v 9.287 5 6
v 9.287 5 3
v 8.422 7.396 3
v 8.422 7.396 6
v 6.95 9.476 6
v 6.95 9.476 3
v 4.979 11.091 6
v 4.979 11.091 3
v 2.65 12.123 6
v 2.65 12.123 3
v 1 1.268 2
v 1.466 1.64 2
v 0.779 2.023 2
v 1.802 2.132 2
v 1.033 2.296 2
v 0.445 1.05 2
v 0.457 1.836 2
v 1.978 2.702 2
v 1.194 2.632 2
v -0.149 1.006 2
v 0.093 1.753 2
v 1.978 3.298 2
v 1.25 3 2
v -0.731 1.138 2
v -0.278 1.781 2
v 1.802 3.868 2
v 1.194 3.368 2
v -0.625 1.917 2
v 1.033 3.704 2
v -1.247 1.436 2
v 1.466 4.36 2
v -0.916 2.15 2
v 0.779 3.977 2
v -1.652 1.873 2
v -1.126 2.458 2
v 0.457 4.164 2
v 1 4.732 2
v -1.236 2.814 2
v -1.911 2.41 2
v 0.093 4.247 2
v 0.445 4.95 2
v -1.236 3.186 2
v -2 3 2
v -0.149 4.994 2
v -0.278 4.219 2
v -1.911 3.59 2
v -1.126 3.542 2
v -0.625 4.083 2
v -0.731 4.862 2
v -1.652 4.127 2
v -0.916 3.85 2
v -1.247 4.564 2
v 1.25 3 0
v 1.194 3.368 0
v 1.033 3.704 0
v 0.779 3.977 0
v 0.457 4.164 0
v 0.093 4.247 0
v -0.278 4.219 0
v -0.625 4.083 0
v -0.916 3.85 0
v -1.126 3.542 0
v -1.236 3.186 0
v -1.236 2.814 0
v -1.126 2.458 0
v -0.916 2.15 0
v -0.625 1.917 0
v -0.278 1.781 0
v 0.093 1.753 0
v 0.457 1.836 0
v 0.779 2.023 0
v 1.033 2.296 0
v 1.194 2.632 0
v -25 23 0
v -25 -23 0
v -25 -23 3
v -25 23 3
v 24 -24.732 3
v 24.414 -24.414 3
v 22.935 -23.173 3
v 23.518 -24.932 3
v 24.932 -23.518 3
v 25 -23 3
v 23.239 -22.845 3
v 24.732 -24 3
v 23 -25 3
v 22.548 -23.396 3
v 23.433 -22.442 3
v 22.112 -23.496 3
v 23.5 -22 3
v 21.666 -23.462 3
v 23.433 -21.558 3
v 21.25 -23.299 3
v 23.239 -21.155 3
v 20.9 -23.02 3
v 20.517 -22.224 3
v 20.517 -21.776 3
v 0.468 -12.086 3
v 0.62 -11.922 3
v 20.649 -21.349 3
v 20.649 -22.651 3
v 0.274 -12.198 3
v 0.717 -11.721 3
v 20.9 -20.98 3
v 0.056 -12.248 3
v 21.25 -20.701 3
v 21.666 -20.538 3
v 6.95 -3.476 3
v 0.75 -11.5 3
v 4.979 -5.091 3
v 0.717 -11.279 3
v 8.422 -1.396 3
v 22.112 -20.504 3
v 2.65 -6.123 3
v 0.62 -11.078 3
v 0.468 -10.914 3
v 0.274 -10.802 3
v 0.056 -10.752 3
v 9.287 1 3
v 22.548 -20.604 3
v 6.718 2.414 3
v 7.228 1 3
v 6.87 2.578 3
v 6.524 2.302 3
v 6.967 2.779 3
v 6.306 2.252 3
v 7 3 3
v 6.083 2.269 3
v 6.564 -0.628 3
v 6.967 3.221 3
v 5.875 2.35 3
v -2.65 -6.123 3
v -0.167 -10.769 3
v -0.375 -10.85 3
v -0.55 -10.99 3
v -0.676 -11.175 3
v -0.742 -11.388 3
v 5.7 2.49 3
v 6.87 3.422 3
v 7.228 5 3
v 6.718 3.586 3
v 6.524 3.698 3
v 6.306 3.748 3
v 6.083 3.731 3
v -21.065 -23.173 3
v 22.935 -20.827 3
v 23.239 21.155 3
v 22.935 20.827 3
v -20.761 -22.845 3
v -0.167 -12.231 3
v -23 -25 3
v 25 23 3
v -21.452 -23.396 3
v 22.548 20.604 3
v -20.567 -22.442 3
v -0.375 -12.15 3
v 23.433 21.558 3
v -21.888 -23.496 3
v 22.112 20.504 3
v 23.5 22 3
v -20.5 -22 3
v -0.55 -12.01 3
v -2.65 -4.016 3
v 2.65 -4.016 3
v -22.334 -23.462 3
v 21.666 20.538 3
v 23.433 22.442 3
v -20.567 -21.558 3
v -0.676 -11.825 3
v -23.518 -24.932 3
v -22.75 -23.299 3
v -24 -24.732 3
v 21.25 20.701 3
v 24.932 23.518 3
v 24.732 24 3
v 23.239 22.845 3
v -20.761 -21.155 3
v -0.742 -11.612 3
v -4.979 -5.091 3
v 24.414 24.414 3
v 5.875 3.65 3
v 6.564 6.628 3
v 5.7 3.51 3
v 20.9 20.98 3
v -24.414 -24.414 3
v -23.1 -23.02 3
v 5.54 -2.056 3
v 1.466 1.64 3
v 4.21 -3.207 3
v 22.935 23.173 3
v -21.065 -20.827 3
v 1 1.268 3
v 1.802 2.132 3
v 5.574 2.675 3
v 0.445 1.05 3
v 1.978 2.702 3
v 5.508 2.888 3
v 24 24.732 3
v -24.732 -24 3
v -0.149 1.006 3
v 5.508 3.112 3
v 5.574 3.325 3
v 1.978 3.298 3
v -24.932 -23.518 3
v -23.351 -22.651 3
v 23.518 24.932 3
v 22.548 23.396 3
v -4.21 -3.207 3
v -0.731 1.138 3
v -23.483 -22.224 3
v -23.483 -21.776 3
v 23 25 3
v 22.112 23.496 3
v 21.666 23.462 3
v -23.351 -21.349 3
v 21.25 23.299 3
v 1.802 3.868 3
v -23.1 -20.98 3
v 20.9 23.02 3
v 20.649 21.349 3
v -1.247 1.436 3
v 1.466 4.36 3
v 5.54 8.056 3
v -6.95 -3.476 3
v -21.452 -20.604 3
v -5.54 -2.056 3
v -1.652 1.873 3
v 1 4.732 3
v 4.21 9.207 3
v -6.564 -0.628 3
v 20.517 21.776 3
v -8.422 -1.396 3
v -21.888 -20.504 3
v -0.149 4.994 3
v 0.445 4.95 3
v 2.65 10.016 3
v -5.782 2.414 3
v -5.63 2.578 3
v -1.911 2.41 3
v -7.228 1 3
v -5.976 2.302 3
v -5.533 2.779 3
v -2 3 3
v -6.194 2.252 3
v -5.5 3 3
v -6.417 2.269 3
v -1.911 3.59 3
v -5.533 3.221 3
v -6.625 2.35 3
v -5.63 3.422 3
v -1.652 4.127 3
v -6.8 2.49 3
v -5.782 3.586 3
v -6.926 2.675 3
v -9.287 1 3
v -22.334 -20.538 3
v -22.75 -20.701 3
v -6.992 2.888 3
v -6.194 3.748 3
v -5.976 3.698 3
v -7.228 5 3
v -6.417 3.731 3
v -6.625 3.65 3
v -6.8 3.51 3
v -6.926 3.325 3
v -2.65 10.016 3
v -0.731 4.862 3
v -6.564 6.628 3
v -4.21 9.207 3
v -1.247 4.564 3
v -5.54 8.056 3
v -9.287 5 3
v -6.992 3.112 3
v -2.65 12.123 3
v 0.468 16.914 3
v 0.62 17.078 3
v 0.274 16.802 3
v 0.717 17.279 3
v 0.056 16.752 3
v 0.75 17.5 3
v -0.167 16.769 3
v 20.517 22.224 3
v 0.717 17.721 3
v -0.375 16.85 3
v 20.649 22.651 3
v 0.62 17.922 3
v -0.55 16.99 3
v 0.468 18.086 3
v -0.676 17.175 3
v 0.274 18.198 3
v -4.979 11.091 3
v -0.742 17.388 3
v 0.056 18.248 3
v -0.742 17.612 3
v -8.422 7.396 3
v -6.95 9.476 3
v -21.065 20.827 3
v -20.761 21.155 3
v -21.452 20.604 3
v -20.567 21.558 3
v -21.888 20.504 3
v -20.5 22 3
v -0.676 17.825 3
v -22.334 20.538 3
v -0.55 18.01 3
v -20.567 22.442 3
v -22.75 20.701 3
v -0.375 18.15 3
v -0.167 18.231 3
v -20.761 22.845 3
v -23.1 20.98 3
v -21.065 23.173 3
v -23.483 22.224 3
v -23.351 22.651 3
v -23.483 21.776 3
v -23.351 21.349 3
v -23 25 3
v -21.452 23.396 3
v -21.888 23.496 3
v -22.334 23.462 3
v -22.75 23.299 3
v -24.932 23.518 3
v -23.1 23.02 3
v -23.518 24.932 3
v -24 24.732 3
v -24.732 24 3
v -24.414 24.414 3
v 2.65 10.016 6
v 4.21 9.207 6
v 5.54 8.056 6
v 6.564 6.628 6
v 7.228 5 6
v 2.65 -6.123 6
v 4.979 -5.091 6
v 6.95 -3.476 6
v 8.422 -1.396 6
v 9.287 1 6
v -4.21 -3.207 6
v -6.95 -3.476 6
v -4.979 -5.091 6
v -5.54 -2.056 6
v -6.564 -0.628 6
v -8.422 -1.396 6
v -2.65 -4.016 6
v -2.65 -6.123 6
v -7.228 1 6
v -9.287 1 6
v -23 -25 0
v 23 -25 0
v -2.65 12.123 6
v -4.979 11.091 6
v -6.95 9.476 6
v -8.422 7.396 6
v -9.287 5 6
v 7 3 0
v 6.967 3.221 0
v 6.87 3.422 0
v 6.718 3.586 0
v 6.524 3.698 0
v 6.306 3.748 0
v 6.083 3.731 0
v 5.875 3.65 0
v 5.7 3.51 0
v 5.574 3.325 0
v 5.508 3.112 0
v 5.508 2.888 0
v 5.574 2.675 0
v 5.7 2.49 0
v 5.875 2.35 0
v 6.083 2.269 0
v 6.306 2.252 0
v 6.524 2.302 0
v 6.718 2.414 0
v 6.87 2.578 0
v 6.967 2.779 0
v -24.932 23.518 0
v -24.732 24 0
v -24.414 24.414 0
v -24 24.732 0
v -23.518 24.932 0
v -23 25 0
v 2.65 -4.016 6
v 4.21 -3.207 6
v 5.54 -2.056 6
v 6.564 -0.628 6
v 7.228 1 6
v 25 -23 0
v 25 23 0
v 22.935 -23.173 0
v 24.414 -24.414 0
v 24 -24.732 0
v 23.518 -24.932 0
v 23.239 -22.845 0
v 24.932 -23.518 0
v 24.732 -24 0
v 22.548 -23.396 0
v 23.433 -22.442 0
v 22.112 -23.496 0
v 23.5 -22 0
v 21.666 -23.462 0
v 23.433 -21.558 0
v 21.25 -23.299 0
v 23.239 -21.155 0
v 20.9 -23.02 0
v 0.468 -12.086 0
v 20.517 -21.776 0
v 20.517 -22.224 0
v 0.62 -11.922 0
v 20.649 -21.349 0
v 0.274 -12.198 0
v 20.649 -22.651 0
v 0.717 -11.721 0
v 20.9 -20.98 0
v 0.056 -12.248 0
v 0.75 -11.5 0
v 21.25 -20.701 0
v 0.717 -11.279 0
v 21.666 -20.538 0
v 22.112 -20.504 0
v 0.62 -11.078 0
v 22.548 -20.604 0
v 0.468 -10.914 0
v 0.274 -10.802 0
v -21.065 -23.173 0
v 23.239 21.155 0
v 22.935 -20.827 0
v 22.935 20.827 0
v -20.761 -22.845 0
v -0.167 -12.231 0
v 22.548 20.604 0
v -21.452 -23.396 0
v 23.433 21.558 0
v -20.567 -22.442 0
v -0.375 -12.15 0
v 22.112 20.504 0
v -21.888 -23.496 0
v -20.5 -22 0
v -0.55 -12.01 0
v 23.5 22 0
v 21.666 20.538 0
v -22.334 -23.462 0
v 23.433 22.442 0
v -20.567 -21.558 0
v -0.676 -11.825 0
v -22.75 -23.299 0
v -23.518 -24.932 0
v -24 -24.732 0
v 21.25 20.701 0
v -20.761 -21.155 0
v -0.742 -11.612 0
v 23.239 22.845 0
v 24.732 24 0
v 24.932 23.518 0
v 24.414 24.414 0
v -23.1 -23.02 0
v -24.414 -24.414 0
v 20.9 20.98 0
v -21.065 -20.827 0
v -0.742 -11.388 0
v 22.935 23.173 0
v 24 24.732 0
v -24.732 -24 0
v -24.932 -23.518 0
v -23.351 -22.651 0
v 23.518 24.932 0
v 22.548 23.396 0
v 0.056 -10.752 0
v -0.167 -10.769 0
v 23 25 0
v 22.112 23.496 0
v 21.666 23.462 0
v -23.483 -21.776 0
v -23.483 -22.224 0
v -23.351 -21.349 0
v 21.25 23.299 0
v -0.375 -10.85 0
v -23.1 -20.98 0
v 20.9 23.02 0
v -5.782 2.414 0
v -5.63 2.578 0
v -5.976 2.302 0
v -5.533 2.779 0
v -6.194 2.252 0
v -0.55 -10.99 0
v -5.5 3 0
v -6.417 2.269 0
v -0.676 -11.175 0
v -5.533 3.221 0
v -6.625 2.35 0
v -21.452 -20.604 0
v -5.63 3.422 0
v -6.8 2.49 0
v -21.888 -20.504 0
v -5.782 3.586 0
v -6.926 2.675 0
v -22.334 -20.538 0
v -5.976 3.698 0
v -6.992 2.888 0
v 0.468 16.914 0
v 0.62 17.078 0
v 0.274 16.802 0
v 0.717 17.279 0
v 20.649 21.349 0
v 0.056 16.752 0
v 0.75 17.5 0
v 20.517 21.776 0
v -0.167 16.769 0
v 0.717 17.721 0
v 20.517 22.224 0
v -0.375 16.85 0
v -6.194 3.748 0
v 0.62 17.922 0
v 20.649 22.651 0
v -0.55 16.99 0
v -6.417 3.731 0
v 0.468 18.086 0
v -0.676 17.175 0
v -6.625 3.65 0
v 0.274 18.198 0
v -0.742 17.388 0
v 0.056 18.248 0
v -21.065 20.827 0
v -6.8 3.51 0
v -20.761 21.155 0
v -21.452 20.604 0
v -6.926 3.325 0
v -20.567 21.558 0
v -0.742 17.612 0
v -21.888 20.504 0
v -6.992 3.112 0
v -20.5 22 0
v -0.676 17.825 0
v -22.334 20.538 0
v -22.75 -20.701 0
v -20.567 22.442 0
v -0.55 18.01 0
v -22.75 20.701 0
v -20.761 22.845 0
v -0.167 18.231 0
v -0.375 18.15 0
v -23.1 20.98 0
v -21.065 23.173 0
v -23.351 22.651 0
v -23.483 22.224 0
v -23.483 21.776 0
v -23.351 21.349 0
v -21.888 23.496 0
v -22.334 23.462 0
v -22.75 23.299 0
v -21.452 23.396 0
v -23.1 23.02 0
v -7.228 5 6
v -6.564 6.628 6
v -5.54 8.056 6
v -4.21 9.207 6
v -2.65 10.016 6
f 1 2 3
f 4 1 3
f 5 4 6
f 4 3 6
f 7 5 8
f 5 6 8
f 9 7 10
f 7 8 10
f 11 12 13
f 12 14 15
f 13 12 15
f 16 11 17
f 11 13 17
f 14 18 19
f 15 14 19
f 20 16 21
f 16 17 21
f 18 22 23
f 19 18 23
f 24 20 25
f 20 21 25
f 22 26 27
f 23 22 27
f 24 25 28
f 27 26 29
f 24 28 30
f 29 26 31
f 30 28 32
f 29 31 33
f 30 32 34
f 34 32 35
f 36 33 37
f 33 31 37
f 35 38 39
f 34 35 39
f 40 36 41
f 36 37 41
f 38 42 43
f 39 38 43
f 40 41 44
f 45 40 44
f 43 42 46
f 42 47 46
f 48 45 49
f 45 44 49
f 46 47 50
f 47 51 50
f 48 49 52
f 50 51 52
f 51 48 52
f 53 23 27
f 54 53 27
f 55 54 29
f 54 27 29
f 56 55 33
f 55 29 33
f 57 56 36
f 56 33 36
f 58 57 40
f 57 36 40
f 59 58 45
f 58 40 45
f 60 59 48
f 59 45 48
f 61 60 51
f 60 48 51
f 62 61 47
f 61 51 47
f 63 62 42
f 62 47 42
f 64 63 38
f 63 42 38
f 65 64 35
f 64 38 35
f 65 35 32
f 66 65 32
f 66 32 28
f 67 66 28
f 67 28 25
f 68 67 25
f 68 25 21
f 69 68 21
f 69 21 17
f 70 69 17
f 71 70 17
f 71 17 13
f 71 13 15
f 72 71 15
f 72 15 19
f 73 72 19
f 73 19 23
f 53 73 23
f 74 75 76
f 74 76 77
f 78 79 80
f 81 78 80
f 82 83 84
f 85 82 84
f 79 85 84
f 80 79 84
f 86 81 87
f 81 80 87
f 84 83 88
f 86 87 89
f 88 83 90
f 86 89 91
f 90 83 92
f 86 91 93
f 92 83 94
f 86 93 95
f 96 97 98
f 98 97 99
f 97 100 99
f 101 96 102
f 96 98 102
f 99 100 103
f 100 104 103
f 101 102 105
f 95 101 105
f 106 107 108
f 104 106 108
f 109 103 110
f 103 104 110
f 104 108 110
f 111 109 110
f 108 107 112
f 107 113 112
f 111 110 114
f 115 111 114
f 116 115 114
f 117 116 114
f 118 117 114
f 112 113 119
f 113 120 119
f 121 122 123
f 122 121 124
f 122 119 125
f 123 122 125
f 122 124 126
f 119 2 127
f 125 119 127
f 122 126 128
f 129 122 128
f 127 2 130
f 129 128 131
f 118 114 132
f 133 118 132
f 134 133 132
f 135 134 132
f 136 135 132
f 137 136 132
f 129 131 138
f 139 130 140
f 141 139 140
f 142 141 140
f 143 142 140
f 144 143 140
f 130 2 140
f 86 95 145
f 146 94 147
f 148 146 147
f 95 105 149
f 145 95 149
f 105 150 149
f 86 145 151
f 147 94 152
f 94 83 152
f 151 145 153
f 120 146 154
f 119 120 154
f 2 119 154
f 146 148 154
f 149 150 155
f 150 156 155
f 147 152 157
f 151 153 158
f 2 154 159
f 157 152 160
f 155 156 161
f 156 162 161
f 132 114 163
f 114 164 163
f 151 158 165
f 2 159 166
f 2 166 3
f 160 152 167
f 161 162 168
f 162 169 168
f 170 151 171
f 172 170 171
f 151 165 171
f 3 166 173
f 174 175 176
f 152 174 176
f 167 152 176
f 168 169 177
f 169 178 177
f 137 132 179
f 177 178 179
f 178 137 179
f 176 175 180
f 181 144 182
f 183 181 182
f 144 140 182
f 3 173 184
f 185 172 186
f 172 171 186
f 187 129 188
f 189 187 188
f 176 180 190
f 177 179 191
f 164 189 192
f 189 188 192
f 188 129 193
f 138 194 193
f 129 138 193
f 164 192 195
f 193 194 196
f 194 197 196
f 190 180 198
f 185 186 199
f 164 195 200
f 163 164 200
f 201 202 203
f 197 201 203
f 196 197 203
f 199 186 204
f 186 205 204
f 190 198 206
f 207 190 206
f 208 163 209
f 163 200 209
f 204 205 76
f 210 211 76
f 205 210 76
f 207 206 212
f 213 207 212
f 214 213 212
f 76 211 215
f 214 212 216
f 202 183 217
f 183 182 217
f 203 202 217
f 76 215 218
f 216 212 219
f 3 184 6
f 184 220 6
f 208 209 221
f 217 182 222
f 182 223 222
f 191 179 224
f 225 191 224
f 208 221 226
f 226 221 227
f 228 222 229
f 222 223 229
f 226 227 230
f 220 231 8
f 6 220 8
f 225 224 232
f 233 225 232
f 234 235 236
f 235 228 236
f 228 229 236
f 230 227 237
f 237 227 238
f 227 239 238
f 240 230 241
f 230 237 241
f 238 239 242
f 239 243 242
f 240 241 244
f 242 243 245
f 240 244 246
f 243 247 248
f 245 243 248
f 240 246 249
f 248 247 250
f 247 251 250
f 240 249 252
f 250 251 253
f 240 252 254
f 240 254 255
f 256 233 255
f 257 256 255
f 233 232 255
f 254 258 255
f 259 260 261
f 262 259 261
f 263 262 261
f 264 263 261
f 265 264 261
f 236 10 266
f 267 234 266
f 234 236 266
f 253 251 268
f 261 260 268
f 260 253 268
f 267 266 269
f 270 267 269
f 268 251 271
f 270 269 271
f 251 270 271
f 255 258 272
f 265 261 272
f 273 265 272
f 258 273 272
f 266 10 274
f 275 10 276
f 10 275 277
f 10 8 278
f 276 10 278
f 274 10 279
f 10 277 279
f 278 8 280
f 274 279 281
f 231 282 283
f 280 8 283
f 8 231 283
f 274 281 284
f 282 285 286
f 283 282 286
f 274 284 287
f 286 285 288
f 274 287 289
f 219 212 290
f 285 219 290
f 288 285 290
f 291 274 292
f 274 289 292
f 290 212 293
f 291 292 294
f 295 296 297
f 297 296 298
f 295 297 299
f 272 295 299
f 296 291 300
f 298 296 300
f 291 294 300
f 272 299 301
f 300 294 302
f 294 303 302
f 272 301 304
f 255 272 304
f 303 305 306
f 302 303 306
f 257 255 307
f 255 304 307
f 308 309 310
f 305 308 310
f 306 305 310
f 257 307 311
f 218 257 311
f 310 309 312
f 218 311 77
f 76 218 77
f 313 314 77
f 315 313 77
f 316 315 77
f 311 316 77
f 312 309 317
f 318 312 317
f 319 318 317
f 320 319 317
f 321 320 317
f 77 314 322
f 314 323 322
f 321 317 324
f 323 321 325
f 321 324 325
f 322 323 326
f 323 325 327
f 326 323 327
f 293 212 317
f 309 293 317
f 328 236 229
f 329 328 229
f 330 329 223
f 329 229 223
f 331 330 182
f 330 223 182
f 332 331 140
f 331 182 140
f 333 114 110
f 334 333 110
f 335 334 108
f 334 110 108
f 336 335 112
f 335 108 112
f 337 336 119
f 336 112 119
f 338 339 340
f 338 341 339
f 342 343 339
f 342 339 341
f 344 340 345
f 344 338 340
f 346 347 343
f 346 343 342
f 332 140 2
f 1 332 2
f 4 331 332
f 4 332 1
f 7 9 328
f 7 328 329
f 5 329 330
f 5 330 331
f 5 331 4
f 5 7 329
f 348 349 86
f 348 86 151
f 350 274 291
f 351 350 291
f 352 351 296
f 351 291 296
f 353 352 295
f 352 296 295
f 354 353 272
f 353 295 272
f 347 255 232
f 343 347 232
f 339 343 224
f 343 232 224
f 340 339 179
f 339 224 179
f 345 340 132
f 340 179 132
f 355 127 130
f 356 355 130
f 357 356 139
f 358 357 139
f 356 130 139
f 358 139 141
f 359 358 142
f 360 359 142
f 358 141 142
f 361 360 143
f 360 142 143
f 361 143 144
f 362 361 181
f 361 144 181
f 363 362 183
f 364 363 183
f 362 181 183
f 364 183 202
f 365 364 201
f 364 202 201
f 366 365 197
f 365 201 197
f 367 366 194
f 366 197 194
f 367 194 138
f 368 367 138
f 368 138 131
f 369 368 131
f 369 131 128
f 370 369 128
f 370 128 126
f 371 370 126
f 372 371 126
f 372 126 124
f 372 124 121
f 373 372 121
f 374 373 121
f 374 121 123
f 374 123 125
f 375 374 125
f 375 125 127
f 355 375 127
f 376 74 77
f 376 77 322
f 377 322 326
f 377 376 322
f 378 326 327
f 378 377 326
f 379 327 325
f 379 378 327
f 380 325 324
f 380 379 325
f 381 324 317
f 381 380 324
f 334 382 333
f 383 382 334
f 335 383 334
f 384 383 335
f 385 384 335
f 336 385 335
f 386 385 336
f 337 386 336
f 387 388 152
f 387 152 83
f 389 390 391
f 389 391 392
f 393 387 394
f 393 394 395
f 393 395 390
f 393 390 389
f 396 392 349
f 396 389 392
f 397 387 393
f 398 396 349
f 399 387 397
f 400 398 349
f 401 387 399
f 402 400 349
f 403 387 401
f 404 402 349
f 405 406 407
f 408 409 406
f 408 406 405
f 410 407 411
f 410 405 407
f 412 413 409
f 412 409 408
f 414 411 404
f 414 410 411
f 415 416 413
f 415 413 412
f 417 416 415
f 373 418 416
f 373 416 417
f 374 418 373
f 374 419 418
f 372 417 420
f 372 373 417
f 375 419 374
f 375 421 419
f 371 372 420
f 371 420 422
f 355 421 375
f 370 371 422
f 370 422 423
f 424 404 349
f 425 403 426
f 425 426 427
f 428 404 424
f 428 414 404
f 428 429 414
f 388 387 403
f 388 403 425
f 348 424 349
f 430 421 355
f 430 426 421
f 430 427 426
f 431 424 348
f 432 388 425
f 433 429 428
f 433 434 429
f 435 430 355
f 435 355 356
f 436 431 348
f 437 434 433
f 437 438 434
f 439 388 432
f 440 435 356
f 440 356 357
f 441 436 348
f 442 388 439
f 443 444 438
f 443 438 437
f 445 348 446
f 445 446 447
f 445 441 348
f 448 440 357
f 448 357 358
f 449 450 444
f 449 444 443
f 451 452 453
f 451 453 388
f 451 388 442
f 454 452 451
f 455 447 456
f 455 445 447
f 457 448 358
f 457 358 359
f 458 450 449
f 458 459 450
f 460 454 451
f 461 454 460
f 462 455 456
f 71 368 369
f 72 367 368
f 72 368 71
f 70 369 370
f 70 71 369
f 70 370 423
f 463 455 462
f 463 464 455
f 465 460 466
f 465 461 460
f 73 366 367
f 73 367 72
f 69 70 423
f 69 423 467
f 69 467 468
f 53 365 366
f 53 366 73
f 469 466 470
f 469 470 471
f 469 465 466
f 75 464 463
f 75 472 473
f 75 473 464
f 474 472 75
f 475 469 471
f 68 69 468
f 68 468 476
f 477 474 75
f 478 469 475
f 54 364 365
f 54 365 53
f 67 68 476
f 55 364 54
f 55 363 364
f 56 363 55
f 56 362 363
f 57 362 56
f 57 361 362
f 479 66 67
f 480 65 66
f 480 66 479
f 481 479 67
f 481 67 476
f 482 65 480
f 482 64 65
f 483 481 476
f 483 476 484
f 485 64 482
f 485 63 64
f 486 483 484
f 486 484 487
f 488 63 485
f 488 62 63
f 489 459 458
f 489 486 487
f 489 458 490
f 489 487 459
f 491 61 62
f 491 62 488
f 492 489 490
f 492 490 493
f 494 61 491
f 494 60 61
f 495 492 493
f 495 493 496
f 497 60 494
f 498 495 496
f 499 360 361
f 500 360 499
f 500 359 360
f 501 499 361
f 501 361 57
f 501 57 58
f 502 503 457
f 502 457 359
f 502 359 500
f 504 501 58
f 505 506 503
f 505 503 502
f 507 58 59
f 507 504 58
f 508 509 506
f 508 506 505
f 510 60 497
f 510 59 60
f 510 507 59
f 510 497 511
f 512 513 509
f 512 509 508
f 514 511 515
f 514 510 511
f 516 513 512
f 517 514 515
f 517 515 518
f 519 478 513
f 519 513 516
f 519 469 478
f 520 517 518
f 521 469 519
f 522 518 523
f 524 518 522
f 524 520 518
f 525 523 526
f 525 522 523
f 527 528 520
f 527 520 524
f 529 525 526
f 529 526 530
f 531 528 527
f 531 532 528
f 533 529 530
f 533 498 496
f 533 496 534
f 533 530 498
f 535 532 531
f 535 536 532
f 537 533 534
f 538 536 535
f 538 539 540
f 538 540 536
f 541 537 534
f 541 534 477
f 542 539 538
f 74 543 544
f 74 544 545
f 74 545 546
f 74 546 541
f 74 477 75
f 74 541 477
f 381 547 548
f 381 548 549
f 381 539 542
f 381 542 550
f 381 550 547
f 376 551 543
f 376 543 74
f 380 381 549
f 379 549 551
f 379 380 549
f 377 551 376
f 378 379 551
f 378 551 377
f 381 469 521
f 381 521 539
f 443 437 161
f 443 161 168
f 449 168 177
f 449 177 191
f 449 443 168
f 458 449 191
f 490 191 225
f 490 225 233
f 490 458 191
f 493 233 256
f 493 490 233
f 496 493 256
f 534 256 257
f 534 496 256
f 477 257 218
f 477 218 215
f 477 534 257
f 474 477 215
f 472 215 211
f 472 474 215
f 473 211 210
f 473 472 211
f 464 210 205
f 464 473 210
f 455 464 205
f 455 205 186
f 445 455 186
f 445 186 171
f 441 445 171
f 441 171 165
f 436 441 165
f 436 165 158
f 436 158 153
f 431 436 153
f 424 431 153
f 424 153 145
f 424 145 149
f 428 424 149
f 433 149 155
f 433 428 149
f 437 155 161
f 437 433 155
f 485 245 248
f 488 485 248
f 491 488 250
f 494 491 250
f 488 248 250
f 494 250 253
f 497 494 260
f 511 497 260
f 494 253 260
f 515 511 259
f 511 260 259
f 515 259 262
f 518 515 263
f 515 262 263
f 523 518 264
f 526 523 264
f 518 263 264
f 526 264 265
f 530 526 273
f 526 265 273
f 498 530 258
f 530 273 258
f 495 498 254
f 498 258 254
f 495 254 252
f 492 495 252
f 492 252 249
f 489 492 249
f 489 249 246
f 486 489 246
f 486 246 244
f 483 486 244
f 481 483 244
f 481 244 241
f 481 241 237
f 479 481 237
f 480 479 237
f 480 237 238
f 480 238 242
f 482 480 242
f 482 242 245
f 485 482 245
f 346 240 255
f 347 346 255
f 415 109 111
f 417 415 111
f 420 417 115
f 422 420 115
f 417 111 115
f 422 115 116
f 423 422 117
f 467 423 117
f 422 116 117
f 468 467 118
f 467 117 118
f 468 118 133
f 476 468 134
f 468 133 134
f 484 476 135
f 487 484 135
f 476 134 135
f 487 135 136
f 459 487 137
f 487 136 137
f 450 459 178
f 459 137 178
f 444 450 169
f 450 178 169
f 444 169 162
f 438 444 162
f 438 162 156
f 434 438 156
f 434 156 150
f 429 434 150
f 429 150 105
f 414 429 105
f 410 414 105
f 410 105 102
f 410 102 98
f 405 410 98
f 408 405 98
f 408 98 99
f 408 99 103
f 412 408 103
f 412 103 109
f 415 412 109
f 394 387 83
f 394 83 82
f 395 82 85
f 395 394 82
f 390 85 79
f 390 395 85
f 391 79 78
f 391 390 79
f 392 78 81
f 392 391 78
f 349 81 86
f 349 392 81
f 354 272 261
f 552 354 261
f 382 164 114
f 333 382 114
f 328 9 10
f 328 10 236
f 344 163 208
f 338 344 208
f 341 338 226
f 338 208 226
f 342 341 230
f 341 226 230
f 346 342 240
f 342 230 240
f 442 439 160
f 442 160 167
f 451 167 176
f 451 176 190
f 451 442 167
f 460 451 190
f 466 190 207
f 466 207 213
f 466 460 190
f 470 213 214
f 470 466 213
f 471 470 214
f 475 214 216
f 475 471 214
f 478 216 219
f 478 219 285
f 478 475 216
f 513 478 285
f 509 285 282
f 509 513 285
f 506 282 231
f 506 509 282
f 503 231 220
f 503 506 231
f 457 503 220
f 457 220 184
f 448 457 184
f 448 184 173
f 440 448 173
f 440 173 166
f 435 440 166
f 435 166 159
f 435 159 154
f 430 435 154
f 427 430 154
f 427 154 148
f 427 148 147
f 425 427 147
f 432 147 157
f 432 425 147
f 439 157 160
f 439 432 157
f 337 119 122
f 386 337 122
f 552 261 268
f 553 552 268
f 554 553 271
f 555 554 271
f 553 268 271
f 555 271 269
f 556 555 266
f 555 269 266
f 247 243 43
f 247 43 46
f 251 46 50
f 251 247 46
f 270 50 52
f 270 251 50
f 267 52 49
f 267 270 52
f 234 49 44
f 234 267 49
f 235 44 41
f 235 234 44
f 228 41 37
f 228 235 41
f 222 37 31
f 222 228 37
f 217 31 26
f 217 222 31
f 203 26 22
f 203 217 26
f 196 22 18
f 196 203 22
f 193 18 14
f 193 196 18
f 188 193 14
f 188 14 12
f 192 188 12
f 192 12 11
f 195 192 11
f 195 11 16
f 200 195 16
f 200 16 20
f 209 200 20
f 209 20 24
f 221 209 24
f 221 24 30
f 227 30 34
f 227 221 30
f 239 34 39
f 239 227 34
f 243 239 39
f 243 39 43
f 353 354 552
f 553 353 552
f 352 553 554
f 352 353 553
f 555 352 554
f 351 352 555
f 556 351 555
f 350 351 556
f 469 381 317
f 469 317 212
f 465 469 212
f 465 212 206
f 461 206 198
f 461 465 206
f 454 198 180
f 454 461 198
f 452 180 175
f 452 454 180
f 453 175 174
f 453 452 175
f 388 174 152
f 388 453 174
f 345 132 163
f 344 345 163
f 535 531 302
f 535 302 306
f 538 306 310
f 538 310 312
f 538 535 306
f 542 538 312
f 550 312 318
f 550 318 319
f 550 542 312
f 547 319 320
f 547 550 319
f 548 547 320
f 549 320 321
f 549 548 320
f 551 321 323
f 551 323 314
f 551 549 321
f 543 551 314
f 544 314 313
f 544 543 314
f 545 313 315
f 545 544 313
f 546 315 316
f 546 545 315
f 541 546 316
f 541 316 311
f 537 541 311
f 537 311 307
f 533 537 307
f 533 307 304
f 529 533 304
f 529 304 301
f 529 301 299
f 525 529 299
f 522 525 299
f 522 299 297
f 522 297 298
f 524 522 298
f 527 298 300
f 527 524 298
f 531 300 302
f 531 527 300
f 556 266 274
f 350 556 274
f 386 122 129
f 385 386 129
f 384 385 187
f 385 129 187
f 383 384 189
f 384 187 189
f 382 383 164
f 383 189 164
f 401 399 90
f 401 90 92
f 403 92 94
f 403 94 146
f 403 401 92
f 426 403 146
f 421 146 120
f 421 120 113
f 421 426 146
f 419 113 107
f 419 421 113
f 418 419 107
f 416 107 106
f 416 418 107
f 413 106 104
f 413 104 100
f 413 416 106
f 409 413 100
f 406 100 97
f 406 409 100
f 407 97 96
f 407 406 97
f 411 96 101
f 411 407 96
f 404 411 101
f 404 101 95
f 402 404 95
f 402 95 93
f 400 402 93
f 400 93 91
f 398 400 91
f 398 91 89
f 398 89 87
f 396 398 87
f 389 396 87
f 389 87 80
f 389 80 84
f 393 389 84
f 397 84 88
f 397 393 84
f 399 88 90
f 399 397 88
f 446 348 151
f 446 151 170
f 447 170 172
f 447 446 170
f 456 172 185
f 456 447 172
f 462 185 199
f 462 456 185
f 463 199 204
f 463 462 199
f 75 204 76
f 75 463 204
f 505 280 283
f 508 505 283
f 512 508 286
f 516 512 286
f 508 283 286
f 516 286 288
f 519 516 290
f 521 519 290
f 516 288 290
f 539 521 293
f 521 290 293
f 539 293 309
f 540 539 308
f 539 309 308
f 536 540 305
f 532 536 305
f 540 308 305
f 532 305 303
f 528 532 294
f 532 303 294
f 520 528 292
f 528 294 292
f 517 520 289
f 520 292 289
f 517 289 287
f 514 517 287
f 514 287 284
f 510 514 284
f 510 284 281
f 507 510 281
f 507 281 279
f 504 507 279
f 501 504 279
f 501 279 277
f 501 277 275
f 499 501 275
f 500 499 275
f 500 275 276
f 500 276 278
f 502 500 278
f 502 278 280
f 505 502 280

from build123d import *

# Parameters (mm, degrees)
SKETCH_1_R          = 1.5
EXTRUDE_1_DEPTH     = 3
EXTRUDE_2_DEPTH     = 3
SKETCH_3_R          = 1.25
CUT_EXTRUDE_1_DEPTH = 3
SKETCH_4_R          = 0.75
CUT_EXTRUDE_2_DEPTH = 10
CUT_EXTRUDE_START   = -3
SKETCH_5_R          = 2
CUT_EXTRUDE_3_DEPTH = 1


with BuildPart() as part:
    # 草图1 → 凸台-拉伸1 (new body)
    with BuildSketch(Plane.XY):
        with BuildLine():
            Line((-23, 25), (23, 25))
            ThreePointArc((23, 25), (24.414213562, 24.414213562), (25, 23))
            Line((25, 23), (25, -23))
            ThreePointArc((25, -23), (24.414213562, -24.414213562), (23, -25))
            Line((23, -25), (-23, -25))
            ThreePointArc((-23, -25), (-24.414213562, -24.414213562), (-25, -23))
            Line((-25, -23), (-25, 23))
            ThreePointArc((-25, 23), (-24.414213562, 24.414213562), (-23, 25))
        make_face()
        with Locations((-22, 22)):
            Circle(SKETCH_1_R, mode=Mode.SUBTRACT)
        with Locations((22, 22)):
            Circle(SKETCH_1_R, mode=Mode.SUBTRACT)
        with Locations((22, -22)):
            Circle(SKETCH_1_R, mode=Mode.SUBTRACT)
        with Locations((-22, -22)):
            Circle(SKETCH_1_R, mode=Mode.SUBTRACT)
    extrude(amount=EXTRUDE_1_DEPTH)

    # 草图2 → 凸台-拉伸2 (add)
    with BuildSketch(Plane.XY.offset(3)):
        with BuildLine():
            ThreePointArc((2.65, -6.12291072), (6.950358309, -3.476304453), (9.287087811, 1))
            Line((9.287087811, 1), (7.228416147, 1))
            ThreePointArc((7.228416147, 1), (5.53953249, -2.056043887), (2.65, -4.016231182))
            Line((2.65, -4.016231182), (2.65, -6.12291072))
        make_face()
        with BuildLine():
            Line((-7.228416147, 1), (-9.287087811, 1))
            ThreePointArc((-9.287087811, 1), (-6.950358309, -3.476304453), (-2.65, -6.12291072))
            Line((-2.65, -6.12291072), (-2.65, -4.016231182))
            ThreePointArc((-2.65, -4.016231182), (-5.53953249, -2.056043887), (-7.228416147, 1))
        make_face()
        with BuildLine():
            Line((-2.65, 10.016231182), (-2.65, 12.12291072))
            ThreePointArc((-2.65, 12.12291072), (-6.950358309, 9.476304453), (-9.287087811, 5))
            Line((-9.287087811, 5), (-7.228416147, 5))
            ThreePointArc((-7.228416147, 5), (-5.53953249, 8.056043887), (-2.65, 10.016231182))
        make_face()
        with BuildLine():
            ThreePointArc((9.287087811, 5), (6.950358309, 9.476304453), (2.65, 12.12291072))
            Line((2.65, 12.12291072), (2.65, 10.016231182))
            ThreePointArc((2.65, 10.016231182), (5.53953249, 8.056043887), (7.228416147, 5))
            Line((7.228416147, 5), (9.287087811, 5))
        make_face()
    extrude(amount=EXTRUDE_2_DEPTH)

    # 草图3 → 切除-拉伸1 (cut)
    with BuildSketch(Plane.XY.offset(3)):
        with Locations((0, 3)):
            Circle(SKETCH_3_R)
    extrude(amount=-CUT_EXTRUDE_1_DEPTH, mode=Mode.SUBTRACT)

    # 草图4 → 切除-拉伸2 (cut)
    with BuildSketch(Plane.XY.offset(3)):
        with Locations((0, 17.5)):
            Circle(SKETCH_4_R)
        with Locations((0, -11.5)):
            Circle(SKETCH_4_R)
        with Locations((-6.25, 3)):
            Circle(SKETCH_4_R)
        with Locations((6.25, 3)):
            Circle(SKETCH_4_R)
    extrude(amount=-CUT_EXTRUDE_2_DEPTH, mode=Mode.SUBTRACT)

    # 草图5 → 切除-拉伸3 (cut)
    with BuildSketch(Plane(origin=(0, 0, 0), x_dir=(-1, 0, 0), z_dir=(0, 0, -1)).offset(CUT_EXTRUDE_START)):
        with Locations((0, 3)):
            Circle(SKETCH_5_R)
    extrude(amount=CUT_EXTRUDE_3_DEPTH, mode=Mode.SUBTRACT)


solid = part.part
